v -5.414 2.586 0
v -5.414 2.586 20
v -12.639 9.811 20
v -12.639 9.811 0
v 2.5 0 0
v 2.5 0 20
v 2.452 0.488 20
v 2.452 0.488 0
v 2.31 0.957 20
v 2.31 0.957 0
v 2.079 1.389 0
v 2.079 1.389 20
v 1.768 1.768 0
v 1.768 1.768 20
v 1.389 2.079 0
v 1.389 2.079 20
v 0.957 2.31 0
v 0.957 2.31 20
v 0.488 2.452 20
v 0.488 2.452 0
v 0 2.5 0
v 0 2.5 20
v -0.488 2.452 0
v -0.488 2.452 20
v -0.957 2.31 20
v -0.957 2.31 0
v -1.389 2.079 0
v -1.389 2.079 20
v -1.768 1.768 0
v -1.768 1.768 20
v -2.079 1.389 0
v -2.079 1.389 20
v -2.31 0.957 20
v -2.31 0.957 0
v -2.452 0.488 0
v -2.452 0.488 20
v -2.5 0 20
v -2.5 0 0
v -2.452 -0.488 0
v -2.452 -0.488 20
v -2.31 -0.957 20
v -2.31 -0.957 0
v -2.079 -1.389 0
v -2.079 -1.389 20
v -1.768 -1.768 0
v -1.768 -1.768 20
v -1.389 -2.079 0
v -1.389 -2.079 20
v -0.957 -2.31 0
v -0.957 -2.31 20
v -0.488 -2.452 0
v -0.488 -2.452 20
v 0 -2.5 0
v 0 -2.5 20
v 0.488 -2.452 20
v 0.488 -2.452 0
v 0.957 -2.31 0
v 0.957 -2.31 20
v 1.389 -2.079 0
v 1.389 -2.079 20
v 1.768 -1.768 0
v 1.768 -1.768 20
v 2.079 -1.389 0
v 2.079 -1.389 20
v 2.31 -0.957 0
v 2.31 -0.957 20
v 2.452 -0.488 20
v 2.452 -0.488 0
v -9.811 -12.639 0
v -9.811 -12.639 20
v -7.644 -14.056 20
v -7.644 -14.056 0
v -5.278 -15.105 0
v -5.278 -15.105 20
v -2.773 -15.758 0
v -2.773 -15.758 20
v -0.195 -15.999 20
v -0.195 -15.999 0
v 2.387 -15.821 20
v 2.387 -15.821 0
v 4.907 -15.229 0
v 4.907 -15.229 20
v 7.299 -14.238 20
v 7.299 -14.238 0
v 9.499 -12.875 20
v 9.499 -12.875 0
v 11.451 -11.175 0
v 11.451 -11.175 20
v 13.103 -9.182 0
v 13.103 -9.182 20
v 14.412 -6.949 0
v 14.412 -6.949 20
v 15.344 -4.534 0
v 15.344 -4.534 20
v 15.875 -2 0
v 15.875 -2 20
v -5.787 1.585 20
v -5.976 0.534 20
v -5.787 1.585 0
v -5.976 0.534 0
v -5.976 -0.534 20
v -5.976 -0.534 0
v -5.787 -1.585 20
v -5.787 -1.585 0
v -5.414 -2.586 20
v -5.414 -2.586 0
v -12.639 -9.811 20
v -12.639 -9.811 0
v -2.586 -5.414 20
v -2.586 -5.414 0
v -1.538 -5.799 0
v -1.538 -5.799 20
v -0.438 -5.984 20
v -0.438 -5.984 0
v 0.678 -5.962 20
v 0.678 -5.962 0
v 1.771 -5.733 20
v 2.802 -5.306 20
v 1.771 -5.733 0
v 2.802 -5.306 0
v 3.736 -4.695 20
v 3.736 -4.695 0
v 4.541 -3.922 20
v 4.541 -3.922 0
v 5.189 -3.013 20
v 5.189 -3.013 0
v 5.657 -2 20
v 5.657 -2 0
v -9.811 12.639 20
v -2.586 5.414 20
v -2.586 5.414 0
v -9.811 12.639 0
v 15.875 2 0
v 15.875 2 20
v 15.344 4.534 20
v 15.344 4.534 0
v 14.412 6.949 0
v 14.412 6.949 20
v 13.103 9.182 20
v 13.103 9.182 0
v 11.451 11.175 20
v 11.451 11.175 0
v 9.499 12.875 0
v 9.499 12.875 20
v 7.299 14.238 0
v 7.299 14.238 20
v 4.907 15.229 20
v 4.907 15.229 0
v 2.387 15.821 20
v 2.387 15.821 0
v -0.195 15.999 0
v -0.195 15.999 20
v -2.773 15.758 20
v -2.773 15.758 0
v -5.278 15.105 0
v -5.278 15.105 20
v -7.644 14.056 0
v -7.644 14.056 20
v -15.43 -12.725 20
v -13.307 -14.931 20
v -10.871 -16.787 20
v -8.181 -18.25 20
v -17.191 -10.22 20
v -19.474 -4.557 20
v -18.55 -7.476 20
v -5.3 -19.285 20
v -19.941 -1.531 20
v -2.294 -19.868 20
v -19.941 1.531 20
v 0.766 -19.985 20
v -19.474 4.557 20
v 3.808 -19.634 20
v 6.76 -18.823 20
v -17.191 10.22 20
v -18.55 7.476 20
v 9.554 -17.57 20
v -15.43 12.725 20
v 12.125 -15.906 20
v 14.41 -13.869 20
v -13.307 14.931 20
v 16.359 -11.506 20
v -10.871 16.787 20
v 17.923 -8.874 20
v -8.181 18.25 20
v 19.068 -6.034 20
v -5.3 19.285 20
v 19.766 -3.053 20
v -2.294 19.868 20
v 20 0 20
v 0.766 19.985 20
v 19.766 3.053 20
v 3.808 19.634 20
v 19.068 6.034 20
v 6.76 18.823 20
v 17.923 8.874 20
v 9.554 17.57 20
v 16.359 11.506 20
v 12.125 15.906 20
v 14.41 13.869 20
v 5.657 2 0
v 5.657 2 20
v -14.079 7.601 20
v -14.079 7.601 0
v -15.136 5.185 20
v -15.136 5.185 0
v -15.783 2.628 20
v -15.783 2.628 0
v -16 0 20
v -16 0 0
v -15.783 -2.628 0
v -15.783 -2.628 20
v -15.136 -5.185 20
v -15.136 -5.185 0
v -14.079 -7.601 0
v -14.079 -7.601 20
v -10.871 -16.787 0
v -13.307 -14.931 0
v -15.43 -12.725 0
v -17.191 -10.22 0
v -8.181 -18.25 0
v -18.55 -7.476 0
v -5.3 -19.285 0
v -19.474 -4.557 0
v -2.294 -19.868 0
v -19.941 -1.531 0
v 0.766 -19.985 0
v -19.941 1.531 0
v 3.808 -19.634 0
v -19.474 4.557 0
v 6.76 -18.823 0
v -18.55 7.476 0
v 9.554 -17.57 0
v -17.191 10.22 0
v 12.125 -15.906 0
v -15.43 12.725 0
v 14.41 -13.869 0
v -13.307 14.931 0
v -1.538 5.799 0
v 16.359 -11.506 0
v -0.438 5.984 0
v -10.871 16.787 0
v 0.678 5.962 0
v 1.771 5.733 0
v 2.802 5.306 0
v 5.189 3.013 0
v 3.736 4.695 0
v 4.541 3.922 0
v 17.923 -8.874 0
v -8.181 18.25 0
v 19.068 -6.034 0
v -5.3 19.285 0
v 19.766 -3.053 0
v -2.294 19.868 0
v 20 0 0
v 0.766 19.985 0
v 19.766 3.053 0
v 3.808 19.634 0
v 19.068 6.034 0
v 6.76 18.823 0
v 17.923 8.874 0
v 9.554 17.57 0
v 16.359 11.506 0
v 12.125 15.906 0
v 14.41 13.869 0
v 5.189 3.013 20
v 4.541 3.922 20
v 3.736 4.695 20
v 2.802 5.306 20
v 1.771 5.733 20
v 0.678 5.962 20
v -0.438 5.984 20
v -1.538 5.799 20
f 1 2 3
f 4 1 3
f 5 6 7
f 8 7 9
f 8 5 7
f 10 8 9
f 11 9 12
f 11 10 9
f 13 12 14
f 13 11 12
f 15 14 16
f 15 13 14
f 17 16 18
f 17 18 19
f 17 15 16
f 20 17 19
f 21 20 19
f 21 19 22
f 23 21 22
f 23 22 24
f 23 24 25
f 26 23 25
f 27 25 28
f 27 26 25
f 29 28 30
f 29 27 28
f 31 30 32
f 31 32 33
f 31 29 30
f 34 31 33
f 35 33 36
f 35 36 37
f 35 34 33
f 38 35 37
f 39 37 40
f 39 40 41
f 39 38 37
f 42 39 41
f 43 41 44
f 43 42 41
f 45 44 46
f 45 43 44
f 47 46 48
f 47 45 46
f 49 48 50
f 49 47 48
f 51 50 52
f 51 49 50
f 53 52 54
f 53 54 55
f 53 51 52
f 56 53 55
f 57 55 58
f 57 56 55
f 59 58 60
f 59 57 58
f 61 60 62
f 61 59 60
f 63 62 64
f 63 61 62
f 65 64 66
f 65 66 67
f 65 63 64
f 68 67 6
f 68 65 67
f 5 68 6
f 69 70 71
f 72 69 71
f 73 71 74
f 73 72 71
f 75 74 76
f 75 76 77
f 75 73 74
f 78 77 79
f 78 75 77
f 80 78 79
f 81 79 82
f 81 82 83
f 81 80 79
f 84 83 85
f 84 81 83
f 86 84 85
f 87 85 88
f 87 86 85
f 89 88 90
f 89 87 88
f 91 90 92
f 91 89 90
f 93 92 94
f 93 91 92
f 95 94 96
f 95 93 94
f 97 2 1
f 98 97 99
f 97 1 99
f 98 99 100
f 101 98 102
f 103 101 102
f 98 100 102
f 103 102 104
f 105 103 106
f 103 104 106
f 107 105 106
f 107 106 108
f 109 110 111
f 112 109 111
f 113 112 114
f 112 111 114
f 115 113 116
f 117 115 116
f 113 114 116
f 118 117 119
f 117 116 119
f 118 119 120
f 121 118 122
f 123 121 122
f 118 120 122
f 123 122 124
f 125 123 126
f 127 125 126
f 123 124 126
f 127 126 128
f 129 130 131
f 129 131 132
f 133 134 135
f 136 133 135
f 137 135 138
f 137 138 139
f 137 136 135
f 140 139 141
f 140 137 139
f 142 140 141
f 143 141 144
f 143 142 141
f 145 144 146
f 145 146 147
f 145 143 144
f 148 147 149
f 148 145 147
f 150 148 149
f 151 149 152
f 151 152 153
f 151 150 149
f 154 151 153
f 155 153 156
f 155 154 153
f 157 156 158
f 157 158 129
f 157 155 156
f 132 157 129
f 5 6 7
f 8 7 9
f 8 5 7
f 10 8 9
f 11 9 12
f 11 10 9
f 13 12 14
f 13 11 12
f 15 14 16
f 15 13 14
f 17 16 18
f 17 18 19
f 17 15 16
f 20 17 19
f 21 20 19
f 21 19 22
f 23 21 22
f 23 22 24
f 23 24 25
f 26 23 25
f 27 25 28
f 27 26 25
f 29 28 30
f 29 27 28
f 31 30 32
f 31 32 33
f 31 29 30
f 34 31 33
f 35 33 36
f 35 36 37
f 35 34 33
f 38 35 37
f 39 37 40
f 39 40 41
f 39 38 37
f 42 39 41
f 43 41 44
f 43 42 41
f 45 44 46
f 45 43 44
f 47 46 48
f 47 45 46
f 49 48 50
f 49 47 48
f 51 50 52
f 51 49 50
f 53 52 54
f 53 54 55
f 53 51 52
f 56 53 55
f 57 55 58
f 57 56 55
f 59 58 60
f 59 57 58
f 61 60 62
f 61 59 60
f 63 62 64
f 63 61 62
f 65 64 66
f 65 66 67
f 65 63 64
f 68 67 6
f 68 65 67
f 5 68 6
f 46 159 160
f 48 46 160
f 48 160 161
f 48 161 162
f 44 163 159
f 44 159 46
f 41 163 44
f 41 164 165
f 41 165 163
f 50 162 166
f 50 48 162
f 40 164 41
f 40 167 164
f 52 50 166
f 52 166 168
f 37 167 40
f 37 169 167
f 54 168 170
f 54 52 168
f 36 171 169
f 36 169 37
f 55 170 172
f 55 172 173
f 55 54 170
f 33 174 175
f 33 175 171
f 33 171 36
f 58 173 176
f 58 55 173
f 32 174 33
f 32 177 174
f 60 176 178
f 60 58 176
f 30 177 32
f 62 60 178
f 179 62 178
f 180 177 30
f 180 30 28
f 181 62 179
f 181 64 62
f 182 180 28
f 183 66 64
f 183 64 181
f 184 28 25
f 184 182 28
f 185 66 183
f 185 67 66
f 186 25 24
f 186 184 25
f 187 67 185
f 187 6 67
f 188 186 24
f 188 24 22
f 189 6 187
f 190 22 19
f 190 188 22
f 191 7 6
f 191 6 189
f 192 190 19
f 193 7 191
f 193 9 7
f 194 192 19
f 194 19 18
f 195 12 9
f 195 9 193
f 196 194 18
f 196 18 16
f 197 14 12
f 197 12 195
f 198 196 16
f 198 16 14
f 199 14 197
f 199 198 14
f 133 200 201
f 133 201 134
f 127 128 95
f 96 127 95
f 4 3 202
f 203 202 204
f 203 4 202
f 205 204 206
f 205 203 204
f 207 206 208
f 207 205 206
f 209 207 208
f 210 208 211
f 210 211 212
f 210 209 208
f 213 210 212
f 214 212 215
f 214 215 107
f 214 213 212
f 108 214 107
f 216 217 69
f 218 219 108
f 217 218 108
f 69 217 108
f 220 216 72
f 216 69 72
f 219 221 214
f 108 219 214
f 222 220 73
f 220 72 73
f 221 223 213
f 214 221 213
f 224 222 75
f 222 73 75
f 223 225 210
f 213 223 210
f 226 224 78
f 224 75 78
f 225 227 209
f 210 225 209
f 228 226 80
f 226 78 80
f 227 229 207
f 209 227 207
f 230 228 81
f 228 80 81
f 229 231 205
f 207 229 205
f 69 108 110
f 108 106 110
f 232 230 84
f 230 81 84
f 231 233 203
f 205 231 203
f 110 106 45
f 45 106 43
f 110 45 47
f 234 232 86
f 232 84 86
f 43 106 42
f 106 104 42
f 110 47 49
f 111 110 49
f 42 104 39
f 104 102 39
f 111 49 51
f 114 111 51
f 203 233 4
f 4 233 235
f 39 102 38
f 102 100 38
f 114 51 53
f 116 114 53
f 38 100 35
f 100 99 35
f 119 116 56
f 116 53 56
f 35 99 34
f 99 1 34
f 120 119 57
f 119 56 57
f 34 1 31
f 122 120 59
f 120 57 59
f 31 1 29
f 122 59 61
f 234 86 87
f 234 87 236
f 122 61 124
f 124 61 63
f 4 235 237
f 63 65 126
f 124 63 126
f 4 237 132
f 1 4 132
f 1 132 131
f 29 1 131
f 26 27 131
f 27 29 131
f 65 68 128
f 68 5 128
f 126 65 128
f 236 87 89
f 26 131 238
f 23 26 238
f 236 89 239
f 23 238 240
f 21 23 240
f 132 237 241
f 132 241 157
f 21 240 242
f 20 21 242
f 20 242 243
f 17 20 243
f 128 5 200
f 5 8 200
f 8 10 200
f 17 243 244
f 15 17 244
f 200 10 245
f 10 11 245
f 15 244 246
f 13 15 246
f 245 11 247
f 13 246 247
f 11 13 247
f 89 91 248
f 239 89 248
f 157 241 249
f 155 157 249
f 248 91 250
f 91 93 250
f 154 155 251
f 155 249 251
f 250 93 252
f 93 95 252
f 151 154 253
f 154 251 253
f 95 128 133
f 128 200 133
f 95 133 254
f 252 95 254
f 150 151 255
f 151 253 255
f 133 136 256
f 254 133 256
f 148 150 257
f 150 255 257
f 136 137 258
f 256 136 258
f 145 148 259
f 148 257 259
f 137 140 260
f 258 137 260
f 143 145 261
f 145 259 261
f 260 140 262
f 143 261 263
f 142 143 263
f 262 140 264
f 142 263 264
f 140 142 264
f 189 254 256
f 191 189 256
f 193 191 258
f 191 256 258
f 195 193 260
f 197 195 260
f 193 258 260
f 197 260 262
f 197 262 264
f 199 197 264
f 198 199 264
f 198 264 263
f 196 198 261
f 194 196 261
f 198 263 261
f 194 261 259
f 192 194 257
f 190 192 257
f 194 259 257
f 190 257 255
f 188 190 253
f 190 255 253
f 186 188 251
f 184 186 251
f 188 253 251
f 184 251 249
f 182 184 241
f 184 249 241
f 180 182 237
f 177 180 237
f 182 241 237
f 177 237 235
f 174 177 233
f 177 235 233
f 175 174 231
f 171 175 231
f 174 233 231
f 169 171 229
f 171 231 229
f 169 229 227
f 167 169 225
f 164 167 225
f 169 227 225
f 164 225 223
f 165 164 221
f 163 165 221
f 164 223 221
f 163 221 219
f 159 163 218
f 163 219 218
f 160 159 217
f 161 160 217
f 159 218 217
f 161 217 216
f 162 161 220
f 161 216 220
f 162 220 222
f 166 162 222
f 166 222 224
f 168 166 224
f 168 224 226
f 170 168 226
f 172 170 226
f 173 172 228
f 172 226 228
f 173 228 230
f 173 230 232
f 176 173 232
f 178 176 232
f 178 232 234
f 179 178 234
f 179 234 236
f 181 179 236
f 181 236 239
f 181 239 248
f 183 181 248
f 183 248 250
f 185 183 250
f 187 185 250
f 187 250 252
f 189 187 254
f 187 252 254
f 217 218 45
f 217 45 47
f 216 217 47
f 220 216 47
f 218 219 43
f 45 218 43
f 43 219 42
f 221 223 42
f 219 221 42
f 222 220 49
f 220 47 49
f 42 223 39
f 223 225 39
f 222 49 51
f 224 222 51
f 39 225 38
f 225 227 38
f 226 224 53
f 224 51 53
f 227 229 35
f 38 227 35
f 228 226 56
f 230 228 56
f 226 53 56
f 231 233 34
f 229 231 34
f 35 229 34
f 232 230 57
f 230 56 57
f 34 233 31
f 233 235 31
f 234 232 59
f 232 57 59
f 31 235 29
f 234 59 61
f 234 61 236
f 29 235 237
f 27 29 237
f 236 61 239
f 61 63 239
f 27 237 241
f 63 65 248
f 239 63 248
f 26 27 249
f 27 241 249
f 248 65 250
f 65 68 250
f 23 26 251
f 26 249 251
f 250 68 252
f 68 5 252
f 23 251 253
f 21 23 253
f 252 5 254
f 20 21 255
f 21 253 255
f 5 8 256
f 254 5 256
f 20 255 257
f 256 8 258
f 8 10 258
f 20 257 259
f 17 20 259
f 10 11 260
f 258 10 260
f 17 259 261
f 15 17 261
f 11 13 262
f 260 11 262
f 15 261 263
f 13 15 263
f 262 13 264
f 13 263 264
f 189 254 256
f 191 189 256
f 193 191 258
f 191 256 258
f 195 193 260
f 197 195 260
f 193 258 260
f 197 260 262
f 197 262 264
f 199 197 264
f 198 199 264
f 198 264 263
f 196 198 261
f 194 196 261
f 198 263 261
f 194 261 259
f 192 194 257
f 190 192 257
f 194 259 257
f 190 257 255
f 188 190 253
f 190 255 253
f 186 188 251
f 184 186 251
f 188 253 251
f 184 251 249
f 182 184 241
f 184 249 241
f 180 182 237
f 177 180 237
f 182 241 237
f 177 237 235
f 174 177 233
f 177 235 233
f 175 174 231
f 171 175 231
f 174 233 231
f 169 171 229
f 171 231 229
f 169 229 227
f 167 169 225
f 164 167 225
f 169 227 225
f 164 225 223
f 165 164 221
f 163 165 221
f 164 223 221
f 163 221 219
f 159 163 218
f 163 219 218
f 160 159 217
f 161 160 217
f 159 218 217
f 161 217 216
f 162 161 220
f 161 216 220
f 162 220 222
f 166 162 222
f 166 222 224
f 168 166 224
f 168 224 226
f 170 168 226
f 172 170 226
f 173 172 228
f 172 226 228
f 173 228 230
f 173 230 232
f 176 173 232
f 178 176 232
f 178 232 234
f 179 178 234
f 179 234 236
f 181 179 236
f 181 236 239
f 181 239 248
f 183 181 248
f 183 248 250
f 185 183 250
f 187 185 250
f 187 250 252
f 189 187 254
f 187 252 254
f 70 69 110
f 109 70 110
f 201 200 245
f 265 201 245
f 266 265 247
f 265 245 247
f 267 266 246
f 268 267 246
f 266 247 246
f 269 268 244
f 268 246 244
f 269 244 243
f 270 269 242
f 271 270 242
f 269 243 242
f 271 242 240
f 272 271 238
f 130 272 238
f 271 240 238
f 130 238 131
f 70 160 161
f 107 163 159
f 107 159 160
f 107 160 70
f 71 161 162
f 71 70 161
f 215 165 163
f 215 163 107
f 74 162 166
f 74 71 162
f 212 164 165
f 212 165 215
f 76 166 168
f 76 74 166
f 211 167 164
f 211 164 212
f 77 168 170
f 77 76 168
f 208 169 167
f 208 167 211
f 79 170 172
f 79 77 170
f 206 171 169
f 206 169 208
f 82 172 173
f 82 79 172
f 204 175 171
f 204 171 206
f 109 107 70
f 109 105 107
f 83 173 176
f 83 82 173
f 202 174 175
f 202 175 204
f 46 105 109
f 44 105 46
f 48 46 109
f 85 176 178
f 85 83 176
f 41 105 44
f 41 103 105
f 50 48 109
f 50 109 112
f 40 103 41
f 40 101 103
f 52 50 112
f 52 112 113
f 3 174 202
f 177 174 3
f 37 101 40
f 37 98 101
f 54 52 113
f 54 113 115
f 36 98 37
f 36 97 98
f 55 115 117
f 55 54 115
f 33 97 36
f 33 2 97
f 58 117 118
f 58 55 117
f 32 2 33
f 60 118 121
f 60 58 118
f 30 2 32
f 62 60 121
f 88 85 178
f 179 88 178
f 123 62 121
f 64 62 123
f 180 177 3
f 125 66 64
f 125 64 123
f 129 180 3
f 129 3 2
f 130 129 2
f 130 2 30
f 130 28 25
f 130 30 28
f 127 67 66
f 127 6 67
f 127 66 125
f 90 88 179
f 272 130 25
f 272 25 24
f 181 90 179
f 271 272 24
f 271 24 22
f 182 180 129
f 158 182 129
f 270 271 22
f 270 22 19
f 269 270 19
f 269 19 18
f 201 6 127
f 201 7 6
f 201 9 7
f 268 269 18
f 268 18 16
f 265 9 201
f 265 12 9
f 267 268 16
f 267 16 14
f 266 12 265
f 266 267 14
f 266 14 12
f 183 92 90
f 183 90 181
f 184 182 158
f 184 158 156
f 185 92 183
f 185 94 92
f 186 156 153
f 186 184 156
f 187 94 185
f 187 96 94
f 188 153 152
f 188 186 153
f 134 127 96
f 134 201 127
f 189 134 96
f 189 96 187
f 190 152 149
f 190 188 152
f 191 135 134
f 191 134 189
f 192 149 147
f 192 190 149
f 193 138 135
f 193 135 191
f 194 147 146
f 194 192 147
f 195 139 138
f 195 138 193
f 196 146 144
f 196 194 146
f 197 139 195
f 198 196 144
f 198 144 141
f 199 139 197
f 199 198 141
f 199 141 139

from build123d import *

# Parameters (mm, degrees)
SKETCH_R      = 20
SKETCH_R_2    = 2.5
PAD_DEPTH     = 20
SKETCH001_R   = 20
SKETCH001_R_2 = 2.5
PAD001_DEPTH  = 20


with BuildPart() as body:
    # Sketch → Pad (new body)
    with BuildSketch(Plane.XY):
        Circle(SKETCH_R)
        Circle(SKETCH_R_2, mode=Mode.SUBTRACT)
        with BuildLine():
            ThreePointArc((15.874508, 2), (6.122935, 14.782073), (-9.810759, 12.639186))
            Line((-2.585786, 5.414214), (-9.810759, 12.639186))
            ThreePointArc((5.656854, 2), (2.296101, 5.543277), (-2.585786, 5.414214))
            Line((5.656854, 2), (15.874508, 2))
        make_face(mode=Mode.SUBTRACT)
        with BuildLine():
            Line((5.656854, -2), (15.874508, -2))
            ThreePointArc((-9.810759, -12.639186), (6.122935, -14.782073), (15.874508, -2))
            Line((-9.810759, -12.639186), (-2.585786, -5.414214))
            ThreePointArc((-2.585786, -5.414214), (2.296101, -5.543277), (5.656854, -2))
        make_face(mode=Mode.SUBTRACT)
        with BuildLine():
            Line((-5.414214, 2.585786), (-12.639186, 9.810759))
            ThreePointArc((-12.639186, 9.810759), (-16, 0), (-12.639186, -9.810759))
            Line((-5.414214, -2.585786), (-12.639186, -9.810759))
            ThreePointArc((-5.414214, 2.585786), (-6, 0), (-5.414214, -2.585786))
        make_face(mode=Mode.SUBTRACT)
    extrude(amount=PAD_DEPTH)


with BuildPart() as body001:
    # Sketch001 → Pad001 (new body)
    with BuildSketch(Plane.XY):
        Circle(SKETCH001_R)
        Circle(SKETCH001_R_2, mode=Mode.SUBTRACT)
    extrude(amount=PAD001_DEPTH)


solid = Compound([body.part, body001.part])
